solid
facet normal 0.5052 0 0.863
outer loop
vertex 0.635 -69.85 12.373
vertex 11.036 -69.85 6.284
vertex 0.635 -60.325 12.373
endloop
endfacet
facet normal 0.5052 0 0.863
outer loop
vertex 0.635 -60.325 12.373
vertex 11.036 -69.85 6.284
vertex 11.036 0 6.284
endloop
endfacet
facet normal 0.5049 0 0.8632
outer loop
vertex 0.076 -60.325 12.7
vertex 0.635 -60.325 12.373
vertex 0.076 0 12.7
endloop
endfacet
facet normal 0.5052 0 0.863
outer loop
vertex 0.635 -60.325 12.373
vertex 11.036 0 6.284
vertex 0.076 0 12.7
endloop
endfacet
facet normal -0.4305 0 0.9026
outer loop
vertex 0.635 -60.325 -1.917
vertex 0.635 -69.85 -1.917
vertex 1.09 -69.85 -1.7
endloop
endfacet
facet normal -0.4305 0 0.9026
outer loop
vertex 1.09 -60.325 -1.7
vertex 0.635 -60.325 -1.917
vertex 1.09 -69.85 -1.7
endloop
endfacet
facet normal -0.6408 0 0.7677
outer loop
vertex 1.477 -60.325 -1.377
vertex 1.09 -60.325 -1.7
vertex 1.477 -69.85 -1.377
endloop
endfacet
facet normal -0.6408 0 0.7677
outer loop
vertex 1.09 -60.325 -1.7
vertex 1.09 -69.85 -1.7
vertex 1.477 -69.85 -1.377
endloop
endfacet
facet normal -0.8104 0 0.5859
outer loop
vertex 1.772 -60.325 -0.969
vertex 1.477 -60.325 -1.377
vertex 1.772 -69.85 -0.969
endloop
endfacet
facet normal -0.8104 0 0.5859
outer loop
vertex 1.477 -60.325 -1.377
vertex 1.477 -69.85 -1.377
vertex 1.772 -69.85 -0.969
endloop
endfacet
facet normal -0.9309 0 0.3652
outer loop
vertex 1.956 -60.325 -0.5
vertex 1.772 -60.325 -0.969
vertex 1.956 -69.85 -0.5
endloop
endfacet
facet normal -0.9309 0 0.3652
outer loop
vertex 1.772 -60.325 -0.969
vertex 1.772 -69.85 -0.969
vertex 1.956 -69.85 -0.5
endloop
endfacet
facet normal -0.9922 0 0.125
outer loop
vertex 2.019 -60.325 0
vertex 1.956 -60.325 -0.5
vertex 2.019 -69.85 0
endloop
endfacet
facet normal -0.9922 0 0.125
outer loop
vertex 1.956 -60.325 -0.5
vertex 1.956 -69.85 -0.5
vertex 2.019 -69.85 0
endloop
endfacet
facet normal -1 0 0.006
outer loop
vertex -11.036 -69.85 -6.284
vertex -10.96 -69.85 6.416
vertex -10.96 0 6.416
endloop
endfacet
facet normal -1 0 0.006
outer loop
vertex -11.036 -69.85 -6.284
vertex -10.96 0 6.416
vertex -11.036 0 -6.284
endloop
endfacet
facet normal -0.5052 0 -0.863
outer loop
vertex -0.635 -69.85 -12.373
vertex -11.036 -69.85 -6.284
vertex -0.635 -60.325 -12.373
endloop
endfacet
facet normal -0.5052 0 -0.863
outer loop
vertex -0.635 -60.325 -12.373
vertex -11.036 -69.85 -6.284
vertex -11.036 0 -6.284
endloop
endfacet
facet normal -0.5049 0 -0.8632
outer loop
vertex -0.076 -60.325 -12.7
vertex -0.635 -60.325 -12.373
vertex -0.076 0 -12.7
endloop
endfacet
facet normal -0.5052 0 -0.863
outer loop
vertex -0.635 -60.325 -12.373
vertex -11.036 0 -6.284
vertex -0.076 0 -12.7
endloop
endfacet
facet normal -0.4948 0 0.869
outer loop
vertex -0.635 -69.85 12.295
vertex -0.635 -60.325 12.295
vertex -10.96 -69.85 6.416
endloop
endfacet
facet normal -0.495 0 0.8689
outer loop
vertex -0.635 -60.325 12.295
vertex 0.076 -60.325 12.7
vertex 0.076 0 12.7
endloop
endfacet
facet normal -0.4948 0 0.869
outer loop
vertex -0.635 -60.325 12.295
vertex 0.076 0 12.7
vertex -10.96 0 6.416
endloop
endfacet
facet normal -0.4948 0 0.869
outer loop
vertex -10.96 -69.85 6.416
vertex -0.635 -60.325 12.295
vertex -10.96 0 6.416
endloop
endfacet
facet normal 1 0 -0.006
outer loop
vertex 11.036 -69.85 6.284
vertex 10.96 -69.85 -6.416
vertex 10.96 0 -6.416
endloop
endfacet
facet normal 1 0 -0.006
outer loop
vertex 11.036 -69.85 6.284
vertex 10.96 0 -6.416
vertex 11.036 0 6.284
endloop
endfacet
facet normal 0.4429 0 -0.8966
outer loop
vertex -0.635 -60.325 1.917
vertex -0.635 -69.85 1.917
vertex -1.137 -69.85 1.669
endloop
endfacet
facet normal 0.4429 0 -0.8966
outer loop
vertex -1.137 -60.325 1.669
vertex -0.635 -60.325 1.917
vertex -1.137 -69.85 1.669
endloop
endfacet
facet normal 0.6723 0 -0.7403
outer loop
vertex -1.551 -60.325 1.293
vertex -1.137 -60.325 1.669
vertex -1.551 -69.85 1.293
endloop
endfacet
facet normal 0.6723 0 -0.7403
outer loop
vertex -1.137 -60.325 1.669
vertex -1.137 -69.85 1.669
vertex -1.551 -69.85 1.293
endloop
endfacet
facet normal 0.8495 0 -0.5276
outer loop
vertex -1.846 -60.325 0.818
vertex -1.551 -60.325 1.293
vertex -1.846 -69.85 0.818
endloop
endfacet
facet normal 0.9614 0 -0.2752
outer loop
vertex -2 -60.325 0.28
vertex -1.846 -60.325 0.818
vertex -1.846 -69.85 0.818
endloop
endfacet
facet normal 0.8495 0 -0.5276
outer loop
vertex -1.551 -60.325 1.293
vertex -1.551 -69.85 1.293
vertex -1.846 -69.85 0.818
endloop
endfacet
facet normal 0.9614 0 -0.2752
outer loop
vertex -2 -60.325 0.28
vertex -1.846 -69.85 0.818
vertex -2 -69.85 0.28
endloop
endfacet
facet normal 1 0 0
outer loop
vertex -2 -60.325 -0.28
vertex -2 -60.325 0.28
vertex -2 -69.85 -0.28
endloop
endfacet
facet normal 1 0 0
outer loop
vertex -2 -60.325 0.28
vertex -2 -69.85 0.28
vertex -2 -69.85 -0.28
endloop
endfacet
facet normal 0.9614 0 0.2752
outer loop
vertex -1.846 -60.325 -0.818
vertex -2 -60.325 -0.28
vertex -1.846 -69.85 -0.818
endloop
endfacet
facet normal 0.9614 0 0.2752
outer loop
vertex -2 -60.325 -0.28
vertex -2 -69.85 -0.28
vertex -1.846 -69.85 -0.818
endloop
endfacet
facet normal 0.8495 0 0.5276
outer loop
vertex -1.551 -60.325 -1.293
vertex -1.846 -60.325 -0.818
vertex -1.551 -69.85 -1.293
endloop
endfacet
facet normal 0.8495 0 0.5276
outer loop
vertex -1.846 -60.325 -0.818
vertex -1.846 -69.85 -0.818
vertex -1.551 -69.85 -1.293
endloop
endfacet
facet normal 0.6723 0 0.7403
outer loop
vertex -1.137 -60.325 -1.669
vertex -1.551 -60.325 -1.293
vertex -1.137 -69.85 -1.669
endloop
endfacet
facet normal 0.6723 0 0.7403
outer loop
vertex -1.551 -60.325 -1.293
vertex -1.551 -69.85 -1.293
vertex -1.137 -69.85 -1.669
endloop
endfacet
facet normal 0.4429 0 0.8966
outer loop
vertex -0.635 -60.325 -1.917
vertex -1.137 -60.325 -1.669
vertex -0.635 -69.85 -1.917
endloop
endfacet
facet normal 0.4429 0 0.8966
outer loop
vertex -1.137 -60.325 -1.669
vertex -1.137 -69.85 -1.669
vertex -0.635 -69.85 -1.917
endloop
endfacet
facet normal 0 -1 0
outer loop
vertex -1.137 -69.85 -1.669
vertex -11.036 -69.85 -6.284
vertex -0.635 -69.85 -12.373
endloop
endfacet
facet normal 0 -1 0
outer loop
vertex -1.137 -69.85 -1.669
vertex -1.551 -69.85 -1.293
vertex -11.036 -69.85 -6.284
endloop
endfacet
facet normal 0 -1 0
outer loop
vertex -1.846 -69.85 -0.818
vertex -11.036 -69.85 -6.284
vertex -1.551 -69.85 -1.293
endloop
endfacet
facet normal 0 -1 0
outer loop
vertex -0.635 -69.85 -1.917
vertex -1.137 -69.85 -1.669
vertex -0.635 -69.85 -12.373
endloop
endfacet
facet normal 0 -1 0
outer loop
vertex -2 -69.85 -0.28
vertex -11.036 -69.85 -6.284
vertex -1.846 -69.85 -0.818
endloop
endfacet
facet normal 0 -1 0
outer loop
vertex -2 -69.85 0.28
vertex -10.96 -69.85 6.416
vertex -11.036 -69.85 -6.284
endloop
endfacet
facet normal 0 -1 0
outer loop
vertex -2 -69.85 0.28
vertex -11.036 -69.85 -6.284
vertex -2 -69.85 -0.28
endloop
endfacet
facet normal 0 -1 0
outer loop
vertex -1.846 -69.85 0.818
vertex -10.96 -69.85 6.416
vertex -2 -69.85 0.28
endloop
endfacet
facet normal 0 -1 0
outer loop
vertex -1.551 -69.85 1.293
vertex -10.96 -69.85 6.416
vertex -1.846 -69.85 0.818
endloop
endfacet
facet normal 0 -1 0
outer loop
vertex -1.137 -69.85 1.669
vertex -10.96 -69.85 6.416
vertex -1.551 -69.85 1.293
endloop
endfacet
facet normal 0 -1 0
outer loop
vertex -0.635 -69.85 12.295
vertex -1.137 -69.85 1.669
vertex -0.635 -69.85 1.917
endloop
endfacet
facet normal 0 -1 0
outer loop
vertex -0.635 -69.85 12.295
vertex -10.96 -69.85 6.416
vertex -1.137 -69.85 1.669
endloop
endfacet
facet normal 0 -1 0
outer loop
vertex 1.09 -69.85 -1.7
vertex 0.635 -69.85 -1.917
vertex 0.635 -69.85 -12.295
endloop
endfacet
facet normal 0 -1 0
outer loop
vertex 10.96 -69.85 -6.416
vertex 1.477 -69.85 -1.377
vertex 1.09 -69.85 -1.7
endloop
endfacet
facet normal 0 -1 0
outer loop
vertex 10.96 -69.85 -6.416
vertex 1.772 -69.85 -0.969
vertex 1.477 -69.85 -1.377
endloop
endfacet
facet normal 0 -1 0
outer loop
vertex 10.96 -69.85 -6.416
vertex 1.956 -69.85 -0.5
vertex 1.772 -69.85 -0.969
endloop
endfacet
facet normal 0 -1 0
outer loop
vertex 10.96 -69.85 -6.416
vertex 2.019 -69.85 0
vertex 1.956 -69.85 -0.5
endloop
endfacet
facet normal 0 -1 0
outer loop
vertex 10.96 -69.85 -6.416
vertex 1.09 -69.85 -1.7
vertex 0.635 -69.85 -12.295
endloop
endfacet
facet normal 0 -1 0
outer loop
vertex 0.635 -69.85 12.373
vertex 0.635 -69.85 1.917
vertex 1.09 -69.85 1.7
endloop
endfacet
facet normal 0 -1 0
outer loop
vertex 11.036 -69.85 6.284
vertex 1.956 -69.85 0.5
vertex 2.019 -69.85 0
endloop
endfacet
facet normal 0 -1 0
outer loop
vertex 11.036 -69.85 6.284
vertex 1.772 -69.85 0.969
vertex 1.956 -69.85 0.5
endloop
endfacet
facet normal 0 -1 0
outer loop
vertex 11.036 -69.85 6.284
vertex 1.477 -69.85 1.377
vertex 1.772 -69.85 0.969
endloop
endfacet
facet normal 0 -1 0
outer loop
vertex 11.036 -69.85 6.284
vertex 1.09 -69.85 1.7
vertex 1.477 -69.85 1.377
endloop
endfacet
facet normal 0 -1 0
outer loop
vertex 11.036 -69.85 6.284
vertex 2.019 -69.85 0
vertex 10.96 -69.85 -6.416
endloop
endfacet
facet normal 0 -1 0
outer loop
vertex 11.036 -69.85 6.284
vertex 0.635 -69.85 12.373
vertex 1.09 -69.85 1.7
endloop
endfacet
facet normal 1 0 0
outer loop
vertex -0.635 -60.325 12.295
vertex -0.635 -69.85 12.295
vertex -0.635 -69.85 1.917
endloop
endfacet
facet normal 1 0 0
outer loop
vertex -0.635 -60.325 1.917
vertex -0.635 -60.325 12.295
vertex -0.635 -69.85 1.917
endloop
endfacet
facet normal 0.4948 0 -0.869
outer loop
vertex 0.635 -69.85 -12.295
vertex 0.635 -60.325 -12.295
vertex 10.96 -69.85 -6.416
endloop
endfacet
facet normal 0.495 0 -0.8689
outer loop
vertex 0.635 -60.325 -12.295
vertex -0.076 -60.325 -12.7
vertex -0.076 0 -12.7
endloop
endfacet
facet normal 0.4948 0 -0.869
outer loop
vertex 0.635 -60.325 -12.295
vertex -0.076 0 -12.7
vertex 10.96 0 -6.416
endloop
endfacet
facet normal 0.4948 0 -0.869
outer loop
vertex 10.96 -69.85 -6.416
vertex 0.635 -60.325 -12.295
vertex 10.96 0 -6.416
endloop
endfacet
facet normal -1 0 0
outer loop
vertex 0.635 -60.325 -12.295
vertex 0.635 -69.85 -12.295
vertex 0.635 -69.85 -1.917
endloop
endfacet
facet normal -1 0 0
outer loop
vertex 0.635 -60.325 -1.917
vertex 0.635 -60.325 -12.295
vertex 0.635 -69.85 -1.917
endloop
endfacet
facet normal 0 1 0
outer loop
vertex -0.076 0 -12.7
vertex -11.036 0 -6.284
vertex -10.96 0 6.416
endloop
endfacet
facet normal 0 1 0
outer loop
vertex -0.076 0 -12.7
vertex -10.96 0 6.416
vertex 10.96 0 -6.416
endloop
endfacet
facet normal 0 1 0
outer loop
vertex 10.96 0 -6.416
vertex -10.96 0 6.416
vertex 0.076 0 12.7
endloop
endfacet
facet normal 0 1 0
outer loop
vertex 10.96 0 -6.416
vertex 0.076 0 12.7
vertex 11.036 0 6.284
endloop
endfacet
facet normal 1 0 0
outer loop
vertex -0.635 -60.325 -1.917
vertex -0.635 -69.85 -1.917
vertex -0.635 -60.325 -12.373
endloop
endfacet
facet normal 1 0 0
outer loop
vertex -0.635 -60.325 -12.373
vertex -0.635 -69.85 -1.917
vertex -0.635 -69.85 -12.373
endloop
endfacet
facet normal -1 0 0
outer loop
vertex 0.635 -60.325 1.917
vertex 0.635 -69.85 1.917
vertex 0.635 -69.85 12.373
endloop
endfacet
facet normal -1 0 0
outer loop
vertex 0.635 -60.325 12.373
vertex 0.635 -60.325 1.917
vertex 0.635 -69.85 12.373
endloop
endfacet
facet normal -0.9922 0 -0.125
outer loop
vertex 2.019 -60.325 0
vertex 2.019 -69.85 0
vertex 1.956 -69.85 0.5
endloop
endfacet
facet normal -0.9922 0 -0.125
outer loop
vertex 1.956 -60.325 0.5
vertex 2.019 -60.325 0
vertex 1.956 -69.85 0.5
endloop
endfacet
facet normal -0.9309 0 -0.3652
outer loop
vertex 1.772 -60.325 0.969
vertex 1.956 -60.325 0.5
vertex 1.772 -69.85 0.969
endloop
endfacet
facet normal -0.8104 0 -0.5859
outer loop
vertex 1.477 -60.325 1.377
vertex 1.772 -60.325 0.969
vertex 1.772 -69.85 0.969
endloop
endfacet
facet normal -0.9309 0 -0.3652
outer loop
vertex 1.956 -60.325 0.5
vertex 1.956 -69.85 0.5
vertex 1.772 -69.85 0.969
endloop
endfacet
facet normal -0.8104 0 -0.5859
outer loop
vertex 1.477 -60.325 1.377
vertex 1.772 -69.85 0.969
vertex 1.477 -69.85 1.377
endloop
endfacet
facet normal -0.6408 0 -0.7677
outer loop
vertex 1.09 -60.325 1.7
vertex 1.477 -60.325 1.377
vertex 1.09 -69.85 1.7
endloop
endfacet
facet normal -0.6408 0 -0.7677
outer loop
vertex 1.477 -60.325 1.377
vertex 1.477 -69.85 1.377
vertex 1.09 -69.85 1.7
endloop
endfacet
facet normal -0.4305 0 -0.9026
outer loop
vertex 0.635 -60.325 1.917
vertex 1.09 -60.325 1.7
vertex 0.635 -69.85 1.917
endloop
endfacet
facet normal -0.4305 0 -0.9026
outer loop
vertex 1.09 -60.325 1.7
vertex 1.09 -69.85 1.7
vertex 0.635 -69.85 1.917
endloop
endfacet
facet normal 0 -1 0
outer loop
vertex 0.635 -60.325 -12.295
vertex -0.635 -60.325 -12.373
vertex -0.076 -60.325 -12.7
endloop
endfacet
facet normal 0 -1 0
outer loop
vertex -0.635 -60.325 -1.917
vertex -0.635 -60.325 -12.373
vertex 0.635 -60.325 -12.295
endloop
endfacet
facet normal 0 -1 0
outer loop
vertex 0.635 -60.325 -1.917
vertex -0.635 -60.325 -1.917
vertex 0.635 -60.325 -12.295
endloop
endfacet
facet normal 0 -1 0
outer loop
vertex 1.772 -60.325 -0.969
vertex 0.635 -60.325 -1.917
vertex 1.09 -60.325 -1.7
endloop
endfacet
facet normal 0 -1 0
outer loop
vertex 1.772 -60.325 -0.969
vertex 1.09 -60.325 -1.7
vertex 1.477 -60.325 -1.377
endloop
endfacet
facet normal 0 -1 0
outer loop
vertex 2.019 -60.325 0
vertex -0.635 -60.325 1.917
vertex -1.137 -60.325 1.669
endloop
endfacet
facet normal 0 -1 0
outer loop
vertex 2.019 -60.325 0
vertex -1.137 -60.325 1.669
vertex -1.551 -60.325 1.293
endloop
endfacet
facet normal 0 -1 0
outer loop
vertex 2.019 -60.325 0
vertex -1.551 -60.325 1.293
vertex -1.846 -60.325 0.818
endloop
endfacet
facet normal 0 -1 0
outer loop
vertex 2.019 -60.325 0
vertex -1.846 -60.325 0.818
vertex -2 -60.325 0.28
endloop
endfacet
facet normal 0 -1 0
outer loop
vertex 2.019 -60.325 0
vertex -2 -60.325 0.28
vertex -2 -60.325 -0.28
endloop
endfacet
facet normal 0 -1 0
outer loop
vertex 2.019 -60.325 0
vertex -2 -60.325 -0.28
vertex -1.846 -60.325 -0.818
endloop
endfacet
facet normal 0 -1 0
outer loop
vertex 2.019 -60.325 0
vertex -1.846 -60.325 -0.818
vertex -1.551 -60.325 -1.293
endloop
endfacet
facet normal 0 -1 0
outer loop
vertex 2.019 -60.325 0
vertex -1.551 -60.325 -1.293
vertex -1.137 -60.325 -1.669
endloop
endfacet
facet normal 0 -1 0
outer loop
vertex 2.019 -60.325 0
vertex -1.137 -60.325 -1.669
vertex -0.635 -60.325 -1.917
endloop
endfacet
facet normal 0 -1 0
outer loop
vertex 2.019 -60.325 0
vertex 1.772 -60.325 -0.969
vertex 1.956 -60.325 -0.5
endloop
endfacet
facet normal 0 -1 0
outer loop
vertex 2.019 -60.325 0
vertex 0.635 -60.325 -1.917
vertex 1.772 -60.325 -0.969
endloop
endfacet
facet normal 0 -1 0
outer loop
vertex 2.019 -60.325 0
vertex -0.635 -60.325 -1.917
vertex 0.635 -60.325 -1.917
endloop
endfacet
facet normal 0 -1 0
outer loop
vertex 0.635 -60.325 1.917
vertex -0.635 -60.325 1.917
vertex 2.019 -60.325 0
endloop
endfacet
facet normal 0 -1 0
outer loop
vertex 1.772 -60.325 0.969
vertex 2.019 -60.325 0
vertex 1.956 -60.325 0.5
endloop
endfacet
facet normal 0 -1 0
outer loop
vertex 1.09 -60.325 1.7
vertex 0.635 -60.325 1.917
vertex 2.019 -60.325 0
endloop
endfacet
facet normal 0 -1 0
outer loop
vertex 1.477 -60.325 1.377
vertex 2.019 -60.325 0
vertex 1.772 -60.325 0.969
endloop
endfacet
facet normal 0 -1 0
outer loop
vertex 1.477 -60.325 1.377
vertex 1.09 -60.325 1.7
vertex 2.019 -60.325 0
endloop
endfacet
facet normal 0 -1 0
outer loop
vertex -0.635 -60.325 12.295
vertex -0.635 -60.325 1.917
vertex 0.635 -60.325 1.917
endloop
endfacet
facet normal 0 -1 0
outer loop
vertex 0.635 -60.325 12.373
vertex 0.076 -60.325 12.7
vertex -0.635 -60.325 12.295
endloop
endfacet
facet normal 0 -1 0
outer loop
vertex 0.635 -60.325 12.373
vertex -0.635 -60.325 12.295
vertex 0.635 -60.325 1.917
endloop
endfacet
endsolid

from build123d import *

# Parameters (mm, degrees)
F1_DEPTH = 69.85
F3_DEPTH = 9.525
F5_DEPTH = 9.525


with BuildPart() as f1:
    # F0 (on Front) → F1 (new body)
    with BuildSketch(Plane.XZ):
        Polygon((11.0363666468, 6.2839964384), (0.0760827704, 12.6997721008), (-10.9602838763, 6.4157756624), (-11.0363666468, -6.2839964384), (-0.0760827704, -12.6997721008), (10.9602838763, -6.4157756624), align=None)
    extrude(amount=F1_DEPTH)

    # F2 (on face) → F3 (cut)
    with BuildSketch(Plane.XZ.offset(69.85)):
        Polygon((-0.6350056975, 12.2948854617), (-0.6350056975, 0), (-0.6350056975, -12.372597718), (-0.0760827704, -12.6997721008), (0.634988605, -12.2948951939), (0.634988605, -0.0038041385), (0.634988605, 12.3726077233), (0.0760827704, 12.6997721008), align=None)
    extrude(amount=-F3_DEPTH, mode=Mode.SUBTRACT)

    # F4 (on face) → F5 (cut)
    with BuildSketch(Plane.XZ.offset(69.85)):
        with BuildLine():
            ThreePointArc((0.634988605, -1.9168625307), (1.6370407723, -1.1822309419), (2.0193, 0))
            ThreePointArc((2.0193, 0), (1.6370407723, 1.1822309419), (0.634988605, 1.9168625307))
            Line((0.634988605, 1.9168625307), (0.634988605, -1.9168625307))
        make_face()
        with BuildLine():
            Line((0.634988605, -1.9168625307), (0.634988605, 1.9168625307))
            ThreePointArc((0.634988605, 1.9168625307), (-2.0193, 0), (0.634988605, -1.9168625307))
        make_face()
    extrude(amount=-F5_DEPTH, mode=Mode.SUBTRACT)


solid = f1.part
